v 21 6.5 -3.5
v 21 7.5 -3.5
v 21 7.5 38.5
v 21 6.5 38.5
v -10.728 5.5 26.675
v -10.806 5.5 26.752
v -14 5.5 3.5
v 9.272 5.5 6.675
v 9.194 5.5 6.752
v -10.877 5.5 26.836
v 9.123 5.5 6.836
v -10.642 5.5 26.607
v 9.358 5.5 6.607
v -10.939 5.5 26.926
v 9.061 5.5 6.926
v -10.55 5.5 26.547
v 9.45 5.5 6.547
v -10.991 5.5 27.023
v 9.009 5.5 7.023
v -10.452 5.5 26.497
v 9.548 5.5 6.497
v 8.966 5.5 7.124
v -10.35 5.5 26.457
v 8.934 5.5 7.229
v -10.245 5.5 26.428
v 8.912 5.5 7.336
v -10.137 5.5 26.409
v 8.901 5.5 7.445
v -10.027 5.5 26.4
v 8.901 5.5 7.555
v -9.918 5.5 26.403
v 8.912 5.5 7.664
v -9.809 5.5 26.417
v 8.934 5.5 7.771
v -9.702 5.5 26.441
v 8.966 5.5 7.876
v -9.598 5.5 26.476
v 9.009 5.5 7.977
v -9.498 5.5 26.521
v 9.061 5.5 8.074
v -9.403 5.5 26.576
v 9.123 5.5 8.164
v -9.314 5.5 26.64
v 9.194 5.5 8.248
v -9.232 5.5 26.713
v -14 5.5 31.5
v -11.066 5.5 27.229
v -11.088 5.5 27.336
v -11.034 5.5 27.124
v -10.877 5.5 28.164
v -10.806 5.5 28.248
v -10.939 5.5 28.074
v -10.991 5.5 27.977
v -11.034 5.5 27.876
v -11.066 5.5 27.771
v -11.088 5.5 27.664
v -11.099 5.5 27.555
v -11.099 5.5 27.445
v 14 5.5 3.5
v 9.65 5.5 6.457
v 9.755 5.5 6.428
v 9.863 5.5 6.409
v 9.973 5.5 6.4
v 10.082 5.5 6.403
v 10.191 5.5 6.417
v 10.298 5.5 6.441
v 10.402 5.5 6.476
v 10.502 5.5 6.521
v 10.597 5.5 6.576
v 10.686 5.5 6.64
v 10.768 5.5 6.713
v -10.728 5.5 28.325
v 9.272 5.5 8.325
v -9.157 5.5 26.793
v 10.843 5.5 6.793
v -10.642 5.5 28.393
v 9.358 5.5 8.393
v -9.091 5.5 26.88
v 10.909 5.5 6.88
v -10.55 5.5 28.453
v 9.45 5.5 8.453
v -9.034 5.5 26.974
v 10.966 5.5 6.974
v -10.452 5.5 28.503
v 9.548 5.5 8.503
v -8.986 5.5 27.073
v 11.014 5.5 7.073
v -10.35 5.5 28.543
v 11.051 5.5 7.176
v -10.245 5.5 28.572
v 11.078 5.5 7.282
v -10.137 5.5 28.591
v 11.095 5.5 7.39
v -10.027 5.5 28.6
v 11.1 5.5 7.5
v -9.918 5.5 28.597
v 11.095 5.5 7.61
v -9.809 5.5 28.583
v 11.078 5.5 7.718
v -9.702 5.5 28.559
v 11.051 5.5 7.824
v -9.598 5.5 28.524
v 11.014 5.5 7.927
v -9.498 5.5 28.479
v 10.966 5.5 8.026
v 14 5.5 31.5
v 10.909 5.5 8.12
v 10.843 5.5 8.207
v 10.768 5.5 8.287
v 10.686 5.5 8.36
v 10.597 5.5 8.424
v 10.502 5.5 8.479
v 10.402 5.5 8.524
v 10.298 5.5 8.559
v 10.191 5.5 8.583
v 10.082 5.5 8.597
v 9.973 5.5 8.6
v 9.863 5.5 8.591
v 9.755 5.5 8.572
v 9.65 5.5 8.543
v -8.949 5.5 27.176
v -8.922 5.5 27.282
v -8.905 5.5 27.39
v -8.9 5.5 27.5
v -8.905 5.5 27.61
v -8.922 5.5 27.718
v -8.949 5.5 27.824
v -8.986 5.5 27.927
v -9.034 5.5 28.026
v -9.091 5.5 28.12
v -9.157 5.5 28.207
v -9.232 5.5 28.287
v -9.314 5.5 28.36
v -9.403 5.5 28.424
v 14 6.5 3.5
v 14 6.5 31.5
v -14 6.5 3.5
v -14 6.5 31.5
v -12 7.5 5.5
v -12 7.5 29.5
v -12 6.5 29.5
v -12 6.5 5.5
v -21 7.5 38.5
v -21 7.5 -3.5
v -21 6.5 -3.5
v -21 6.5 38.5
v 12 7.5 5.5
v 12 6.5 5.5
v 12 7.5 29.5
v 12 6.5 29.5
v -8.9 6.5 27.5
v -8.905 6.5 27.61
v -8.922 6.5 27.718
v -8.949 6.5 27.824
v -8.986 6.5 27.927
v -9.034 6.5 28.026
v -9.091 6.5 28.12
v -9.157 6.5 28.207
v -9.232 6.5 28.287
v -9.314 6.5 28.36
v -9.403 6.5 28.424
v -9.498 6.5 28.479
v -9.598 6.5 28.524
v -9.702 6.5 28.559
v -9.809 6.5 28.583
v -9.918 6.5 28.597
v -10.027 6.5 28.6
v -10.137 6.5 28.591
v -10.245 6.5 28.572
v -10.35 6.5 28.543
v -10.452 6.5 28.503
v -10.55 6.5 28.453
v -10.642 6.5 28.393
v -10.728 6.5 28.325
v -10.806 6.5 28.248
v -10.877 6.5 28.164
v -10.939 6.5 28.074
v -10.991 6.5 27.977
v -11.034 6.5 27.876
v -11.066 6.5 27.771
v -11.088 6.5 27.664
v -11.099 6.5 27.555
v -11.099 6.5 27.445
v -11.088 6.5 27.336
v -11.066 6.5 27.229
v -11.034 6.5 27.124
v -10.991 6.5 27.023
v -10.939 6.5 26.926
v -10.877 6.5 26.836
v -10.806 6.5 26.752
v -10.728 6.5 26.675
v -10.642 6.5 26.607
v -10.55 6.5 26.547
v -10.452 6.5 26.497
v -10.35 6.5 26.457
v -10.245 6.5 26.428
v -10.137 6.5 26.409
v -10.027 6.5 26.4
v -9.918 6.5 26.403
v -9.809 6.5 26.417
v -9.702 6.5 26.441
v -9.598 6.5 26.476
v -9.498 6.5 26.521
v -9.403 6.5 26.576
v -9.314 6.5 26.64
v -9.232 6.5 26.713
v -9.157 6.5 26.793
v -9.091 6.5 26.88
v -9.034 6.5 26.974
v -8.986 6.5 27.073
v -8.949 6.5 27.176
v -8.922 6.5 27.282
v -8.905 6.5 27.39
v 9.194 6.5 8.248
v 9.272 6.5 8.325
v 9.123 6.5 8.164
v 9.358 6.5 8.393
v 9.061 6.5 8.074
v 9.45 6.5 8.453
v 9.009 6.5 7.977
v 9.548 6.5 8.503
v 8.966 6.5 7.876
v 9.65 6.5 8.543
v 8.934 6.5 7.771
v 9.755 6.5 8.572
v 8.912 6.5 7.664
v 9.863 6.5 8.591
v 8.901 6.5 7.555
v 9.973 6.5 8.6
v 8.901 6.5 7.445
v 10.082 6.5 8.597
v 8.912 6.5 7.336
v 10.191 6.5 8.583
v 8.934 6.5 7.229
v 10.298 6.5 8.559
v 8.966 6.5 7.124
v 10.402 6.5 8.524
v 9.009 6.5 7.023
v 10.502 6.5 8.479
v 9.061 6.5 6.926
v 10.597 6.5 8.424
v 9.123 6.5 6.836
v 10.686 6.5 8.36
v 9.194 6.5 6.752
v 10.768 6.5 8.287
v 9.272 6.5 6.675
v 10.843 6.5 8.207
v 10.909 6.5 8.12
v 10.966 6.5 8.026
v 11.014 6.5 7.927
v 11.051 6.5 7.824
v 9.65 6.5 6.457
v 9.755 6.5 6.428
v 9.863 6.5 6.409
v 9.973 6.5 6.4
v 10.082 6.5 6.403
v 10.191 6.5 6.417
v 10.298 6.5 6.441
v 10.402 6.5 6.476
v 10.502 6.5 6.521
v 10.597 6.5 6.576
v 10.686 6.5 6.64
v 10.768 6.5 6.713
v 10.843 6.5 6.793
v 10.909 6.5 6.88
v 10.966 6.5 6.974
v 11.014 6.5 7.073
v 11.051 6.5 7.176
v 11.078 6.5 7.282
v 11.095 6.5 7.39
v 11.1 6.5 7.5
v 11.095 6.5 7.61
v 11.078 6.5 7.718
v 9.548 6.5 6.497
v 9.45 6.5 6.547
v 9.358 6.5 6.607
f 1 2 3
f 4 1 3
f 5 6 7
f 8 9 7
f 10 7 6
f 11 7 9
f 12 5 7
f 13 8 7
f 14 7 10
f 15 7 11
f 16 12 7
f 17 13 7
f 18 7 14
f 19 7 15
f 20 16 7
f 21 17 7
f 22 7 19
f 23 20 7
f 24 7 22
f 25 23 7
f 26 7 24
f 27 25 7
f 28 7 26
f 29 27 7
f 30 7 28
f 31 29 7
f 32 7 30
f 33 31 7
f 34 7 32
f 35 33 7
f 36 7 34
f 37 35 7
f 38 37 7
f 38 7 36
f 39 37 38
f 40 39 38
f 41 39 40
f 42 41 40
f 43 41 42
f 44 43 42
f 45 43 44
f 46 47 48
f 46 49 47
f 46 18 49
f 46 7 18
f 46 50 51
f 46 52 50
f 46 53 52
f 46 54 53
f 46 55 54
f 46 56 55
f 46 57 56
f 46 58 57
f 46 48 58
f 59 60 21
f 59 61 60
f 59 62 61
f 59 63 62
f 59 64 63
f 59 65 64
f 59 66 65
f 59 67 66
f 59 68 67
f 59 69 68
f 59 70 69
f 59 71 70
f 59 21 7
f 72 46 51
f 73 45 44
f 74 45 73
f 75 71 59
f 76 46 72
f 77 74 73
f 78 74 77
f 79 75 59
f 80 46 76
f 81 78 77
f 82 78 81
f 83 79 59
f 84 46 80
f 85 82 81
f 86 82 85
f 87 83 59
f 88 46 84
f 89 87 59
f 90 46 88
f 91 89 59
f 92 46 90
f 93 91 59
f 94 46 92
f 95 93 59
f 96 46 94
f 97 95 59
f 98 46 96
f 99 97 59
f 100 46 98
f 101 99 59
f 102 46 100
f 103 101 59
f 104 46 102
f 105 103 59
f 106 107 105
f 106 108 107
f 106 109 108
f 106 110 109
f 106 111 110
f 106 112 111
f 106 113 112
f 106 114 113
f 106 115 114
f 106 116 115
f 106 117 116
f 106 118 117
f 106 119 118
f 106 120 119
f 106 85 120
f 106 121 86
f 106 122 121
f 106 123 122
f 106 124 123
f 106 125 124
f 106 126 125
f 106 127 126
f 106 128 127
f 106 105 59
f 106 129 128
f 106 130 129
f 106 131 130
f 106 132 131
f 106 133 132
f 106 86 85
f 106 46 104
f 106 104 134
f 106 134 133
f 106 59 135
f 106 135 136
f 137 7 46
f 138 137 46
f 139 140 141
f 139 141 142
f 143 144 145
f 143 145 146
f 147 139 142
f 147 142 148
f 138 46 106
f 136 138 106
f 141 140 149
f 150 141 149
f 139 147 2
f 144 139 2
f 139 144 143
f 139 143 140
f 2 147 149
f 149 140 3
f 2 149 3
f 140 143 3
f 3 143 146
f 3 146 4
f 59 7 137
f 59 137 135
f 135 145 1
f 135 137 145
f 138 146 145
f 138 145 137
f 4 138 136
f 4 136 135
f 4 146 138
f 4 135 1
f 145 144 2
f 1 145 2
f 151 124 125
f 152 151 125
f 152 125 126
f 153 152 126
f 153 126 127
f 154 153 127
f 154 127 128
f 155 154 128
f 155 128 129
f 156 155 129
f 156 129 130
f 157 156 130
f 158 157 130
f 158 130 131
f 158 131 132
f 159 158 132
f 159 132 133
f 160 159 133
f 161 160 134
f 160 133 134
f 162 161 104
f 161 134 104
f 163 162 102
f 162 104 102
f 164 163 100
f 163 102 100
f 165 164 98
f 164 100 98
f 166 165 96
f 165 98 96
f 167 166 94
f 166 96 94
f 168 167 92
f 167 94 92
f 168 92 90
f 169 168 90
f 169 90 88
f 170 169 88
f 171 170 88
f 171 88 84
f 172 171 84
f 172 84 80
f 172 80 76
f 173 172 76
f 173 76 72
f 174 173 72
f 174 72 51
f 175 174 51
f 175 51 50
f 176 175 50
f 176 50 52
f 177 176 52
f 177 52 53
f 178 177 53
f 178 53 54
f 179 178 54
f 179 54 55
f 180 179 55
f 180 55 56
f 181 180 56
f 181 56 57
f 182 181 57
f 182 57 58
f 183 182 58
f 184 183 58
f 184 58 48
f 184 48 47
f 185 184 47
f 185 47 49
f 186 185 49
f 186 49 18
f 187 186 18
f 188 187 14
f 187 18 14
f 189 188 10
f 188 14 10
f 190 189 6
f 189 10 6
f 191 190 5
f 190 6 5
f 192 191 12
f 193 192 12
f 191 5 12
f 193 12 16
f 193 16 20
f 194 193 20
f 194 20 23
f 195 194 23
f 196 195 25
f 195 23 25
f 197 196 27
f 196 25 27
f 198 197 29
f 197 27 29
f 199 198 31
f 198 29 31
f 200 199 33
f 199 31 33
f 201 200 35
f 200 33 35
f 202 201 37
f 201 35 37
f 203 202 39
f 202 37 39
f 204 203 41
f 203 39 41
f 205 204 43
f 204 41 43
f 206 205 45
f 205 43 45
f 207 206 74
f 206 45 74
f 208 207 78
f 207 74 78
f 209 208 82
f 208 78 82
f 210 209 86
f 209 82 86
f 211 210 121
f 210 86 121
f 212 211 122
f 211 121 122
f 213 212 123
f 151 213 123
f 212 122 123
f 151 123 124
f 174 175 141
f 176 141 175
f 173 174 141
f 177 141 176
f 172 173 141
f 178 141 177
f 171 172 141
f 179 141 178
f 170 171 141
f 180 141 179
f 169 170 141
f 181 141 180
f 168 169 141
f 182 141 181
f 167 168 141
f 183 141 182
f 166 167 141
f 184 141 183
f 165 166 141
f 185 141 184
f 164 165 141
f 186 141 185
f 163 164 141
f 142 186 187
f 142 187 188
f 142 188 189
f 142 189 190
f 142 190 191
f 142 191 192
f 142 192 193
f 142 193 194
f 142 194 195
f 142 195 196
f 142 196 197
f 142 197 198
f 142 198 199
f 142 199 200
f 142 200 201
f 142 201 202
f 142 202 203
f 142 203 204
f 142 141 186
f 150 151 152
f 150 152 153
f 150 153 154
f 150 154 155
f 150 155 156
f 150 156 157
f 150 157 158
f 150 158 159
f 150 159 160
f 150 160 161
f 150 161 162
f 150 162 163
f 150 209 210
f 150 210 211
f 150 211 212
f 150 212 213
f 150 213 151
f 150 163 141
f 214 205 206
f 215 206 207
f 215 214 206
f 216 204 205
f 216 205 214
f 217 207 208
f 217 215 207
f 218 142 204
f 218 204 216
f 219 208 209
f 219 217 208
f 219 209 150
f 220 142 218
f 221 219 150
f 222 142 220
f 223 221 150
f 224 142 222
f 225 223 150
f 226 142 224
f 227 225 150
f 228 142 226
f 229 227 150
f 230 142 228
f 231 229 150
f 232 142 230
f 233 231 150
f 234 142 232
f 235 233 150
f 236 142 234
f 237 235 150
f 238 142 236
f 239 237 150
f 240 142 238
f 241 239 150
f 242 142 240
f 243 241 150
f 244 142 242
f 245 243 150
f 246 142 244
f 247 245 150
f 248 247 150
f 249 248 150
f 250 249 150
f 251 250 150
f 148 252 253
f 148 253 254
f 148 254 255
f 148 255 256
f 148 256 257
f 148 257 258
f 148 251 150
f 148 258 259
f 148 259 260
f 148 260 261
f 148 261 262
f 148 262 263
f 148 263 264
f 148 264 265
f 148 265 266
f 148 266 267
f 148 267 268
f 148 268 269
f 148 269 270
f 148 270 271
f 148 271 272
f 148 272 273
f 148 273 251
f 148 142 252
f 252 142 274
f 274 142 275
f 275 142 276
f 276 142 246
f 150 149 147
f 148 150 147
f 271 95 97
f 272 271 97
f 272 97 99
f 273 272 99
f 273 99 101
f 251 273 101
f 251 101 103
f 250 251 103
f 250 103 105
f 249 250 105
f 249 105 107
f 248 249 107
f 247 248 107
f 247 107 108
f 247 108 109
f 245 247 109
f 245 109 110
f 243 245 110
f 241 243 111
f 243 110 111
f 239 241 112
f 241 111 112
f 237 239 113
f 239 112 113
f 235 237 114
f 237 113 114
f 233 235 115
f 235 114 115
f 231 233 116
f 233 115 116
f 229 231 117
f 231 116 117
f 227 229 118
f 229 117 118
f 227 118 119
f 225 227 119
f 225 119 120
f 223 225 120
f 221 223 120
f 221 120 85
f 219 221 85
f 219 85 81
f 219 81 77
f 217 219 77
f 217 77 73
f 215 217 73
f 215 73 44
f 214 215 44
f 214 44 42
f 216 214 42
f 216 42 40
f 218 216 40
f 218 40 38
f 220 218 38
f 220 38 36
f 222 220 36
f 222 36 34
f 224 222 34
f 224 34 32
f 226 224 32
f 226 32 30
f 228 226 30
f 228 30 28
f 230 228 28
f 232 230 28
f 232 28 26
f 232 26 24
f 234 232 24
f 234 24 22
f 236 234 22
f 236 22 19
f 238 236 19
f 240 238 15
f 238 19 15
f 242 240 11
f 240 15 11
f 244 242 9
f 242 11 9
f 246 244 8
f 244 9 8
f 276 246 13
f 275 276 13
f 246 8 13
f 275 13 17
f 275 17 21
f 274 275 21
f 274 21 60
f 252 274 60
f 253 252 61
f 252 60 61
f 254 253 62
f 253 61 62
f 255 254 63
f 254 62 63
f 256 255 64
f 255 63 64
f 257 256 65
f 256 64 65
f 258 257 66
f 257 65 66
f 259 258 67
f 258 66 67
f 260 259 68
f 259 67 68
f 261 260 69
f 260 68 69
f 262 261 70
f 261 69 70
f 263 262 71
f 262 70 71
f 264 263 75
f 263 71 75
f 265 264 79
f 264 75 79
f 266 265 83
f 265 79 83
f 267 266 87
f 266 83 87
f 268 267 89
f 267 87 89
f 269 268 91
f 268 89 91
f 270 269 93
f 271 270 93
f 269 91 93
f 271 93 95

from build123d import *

# Parameters (mm, degrees)
SKETCH032_W     = 42
SKETCH032_H     = 42
PAD111_DEPTH    = 2
SKETCH165_W     = 24
SKETCH165_H     = 24
POCKET008_DEPTH = 1
SKETCH167_W     = 42
SKETCH167_H     = 42
SKETCH167_W_2   = 28
SKETCH167_H_2   = 28
POCKET009_DEPTH = 1
SKETCH300_R     = 1.1
POCKET045_DEPTH = 5


with BuildPart() as part:
    # Sketch032 → Pad111 (new body)
    with BuildSketch(Plane.XZ):
        Rectangle(SKETCH032_W, SKETCH032_H)
    extrude(amount=PAD111_DEPTH)

    # Sketch165 (on Face5 of Pad111) → Pocket008 (cut)
    with BuildSketch(Plane(origin=(0, 0, 0), x_dir=(1, 0, 0), z_dir=(0, 1, 0))):
        Rectangle(SKETCH165_W, SKETCH165_H)
    extrude(amount=-POCKET008_DEPTH, mode=Mode.SUBTRACT)

    # Sketch167 (on Face5 of Pocket008) → Pocket009 (cut)
    with BuildSketch(Plane.XZ.offset(2)):
        Rectangle(SKETCH167_W, SKETCH167_H)
        Rectangle(SKETCH167_W_2, SKETCH167_H_2, mode=Mode.SUBTRACT)
    extrude(amount=-POCKET009_DEPTH, mode=Mode.SUBTRACT)

    # Sketch300 (on Face16 of Pocket009) → Pocket045 (cut)
    with BuildSketch(Plane.XZ.offset(2)):
        with Locations((-10, 10)):
            Circle(SKETCH300_R)
        with Locations((10, -10)):
            Circle(SKETCH300_R)
    extrude(amount=-POCKET045_DEPTH, mode=Mode.SUBTRACT)


with BuildPart() as part_1:
    # Body012 placement: moved
    add(part.part.moved(Location((0, 7.5, 17.5))))


solid = part_1.part
